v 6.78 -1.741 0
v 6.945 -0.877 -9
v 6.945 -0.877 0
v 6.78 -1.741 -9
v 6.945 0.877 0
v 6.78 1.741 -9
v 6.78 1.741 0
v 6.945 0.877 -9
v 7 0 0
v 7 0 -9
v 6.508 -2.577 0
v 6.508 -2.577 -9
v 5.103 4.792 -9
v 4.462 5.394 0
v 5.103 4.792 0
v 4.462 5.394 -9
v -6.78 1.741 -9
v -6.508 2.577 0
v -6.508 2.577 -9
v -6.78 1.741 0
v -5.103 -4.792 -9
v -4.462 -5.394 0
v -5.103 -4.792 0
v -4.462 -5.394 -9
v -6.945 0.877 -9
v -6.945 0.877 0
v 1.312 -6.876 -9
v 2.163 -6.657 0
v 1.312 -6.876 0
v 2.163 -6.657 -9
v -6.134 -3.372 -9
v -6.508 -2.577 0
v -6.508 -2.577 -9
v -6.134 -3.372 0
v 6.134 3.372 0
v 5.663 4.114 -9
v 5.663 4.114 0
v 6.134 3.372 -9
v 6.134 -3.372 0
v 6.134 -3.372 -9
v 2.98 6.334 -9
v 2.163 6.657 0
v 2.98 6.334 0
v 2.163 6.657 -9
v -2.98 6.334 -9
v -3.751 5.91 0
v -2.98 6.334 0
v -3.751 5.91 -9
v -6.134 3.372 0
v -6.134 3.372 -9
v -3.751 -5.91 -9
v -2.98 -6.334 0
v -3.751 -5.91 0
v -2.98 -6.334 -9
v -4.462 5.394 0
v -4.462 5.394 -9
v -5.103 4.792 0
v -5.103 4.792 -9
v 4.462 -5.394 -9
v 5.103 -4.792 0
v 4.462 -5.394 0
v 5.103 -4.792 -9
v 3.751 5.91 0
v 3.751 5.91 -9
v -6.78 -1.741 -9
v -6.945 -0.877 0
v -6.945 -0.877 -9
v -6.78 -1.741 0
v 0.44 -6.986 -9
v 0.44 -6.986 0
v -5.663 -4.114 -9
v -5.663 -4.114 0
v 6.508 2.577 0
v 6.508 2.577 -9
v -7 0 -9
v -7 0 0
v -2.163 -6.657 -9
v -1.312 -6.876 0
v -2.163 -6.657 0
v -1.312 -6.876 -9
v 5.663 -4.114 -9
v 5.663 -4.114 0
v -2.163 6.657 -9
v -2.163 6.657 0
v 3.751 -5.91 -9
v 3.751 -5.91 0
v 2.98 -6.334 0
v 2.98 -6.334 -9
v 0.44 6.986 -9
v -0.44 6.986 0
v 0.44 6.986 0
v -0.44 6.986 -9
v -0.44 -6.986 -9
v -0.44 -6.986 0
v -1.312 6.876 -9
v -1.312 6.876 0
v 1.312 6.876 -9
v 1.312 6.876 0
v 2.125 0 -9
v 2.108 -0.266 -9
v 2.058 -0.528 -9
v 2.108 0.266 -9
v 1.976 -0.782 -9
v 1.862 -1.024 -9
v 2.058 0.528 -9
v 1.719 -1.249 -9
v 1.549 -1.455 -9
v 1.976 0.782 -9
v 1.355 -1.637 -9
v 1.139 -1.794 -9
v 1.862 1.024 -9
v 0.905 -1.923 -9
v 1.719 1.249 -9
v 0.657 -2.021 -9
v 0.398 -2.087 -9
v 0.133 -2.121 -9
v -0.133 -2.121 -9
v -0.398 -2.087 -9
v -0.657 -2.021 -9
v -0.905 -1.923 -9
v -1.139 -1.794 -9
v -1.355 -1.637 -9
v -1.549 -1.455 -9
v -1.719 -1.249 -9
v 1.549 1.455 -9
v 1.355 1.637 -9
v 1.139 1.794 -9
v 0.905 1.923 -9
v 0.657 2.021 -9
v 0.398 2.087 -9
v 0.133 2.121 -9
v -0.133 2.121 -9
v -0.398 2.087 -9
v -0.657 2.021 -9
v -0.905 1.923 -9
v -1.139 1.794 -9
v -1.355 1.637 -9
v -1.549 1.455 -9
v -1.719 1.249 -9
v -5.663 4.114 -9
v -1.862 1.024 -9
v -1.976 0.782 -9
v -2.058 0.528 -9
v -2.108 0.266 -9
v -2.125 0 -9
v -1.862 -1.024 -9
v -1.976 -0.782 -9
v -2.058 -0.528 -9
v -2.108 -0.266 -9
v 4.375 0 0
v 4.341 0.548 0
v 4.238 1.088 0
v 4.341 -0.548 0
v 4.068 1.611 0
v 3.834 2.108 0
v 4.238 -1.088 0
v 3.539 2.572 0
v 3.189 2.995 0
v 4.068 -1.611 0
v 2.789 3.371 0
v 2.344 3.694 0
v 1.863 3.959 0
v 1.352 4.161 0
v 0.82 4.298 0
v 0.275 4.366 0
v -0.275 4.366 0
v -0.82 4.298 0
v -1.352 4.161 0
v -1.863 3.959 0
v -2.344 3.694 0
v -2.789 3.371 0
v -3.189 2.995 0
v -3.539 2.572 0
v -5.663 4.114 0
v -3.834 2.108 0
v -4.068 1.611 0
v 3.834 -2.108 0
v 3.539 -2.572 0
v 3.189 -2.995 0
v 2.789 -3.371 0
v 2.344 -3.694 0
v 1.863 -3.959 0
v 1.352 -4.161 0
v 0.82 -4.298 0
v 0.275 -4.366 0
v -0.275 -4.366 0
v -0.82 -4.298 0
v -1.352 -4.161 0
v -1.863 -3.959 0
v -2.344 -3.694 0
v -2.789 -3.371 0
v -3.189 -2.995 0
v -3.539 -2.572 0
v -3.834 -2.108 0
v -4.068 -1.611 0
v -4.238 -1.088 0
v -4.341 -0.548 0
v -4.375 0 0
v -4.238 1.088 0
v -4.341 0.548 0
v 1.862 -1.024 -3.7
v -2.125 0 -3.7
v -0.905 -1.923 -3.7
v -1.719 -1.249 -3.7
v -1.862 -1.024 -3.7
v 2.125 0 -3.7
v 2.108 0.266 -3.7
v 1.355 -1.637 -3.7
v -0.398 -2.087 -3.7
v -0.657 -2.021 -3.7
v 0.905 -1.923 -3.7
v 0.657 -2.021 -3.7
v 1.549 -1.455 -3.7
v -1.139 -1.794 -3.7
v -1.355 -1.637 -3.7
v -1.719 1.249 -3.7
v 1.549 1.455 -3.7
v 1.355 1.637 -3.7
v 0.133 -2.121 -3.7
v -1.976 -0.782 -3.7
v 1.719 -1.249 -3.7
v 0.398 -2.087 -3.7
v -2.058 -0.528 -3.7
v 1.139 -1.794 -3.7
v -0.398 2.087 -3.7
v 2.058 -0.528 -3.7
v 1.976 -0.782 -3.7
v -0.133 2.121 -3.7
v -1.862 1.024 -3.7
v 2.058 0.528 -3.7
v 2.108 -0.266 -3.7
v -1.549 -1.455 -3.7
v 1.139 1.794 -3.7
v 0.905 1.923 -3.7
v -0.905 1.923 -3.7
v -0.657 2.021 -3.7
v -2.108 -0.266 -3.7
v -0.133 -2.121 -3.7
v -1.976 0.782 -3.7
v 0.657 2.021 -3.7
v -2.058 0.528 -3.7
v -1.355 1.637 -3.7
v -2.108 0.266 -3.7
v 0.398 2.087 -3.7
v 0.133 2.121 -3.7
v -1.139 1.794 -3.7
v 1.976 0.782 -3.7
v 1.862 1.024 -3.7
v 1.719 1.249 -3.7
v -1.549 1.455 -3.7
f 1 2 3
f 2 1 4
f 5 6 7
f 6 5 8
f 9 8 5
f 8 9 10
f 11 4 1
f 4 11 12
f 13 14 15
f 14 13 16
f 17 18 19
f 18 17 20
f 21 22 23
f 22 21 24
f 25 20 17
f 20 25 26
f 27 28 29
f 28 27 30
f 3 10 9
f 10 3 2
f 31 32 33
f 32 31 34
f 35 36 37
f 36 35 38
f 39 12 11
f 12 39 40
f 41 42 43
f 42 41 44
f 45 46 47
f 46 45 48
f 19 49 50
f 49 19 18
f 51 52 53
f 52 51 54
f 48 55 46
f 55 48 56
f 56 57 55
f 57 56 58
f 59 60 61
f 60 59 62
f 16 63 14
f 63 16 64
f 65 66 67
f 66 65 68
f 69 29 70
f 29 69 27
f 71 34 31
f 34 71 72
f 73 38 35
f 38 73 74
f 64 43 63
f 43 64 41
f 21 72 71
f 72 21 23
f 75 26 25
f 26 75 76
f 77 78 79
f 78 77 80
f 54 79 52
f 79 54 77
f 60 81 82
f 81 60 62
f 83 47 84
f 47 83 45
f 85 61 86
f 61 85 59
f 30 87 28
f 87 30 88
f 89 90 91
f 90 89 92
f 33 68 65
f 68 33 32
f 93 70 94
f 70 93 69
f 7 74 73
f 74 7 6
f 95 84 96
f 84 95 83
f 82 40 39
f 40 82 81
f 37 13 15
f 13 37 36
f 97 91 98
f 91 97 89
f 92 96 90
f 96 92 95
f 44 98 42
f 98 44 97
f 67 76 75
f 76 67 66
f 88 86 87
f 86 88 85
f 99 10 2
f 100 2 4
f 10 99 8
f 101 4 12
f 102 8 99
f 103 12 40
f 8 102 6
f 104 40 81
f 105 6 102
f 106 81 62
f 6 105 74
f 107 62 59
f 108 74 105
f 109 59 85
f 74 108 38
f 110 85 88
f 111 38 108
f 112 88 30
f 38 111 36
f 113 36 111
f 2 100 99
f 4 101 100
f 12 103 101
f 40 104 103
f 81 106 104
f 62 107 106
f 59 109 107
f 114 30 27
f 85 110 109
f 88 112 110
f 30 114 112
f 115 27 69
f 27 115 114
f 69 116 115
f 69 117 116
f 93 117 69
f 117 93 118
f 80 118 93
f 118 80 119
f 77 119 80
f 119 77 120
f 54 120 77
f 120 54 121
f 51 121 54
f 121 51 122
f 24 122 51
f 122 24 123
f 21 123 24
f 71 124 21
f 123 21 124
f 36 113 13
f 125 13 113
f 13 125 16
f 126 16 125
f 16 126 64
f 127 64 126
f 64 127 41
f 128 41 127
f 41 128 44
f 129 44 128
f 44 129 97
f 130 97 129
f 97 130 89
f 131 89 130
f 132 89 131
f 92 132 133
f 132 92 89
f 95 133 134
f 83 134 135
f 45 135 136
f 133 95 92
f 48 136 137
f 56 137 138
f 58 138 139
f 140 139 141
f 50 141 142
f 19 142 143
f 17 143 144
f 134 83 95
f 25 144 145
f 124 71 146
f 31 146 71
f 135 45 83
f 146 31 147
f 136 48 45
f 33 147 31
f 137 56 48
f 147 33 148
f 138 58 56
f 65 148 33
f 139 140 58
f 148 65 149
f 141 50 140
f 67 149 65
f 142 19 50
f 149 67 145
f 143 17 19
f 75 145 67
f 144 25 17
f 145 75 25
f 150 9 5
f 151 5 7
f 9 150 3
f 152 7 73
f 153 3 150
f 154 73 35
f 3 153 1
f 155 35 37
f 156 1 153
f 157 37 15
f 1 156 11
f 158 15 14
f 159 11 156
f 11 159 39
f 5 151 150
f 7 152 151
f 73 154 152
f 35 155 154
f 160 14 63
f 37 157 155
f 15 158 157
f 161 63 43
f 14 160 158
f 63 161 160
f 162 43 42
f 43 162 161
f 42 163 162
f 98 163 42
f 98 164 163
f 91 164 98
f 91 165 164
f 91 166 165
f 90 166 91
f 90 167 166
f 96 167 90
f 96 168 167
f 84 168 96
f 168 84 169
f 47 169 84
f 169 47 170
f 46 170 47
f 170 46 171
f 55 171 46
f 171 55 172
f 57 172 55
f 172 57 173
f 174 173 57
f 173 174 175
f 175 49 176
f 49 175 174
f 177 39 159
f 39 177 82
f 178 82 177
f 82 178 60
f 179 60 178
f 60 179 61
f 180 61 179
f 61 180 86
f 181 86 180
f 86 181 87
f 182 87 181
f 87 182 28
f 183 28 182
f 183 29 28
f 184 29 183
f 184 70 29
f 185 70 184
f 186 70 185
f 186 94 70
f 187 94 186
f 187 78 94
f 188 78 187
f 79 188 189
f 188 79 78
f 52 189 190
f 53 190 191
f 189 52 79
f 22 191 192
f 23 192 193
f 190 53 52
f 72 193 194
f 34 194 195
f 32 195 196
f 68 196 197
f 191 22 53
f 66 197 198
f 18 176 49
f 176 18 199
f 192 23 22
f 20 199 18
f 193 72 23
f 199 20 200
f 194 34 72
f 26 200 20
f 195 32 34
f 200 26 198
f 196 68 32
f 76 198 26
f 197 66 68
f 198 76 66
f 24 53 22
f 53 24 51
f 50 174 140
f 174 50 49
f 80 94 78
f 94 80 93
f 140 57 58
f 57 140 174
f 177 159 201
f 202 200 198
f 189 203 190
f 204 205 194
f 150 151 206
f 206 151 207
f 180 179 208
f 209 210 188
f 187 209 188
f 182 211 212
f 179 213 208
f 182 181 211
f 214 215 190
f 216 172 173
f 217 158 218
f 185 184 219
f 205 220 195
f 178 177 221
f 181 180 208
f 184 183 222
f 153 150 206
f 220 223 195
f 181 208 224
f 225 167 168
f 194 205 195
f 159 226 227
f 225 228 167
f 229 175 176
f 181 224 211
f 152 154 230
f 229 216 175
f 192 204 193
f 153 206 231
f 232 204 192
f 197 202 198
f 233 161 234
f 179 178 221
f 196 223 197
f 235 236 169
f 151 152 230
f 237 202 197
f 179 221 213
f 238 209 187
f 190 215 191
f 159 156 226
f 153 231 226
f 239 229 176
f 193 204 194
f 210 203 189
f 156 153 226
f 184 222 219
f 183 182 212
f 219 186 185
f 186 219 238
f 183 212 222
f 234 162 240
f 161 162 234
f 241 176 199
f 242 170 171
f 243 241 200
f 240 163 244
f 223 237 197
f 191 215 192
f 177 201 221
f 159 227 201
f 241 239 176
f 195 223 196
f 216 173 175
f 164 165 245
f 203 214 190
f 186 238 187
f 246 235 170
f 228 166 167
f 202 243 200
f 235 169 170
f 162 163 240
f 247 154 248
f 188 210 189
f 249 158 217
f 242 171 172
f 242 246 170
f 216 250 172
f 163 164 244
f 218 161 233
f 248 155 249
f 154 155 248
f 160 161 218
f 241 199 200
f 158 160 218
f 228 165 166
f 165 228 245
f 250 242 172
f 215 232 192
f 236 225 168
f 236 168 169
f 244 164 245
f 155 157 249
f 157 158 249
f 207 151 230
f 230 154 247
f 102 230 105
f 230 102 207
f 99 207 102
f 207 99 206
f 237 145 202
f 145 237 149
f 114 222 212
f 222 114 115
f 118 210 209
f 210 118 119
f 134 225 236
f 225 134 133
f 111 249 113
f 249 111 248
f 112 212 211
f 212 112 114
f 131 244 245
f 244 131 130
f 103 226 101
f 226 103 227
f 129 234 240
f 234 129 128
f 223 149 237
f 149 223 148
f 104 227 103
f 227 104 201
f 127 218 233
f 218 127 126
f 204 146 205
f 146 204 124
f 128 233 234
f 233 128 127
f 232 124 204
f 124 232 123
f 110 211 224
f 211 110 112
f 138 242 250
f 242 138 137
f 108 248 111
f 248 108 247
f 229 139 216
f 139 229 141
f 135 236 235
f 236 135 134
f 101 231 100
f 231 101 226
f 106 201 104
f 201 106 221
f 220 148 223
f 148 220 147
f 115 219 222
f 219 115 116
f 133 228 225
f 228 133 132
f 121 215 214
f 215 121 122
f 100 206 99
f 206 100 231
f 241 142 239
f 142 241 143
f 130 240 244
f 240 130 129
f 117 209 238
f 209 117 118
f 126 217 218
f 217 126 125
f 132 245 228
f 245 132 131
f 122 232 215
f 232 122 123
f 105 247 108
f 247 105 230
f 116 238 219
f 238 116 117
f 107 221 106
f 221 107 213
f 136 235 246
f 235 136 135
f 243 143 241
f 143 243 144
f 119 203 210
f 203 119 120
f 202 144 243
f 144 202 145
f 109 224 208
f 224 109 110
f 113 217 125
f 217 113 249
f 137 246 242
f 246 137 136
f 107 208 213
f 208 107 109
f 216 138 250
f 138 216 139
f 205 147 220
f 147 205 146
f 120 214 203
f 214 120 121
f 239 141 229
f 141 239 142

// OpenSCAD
$fn = 50;


difference() {
	union() {
		translate(v = [0, 0, -9.0000000000]) {
			cylinder(h = 9, r = 7.0000000000);
		}
		translate(v = [0, 0, -9.0000000000]) {
			cylinder(h = 9, r = 2.8750000000);
		}
	}
	union() {
		translate(v = [0, 0, 0]) {
			rotate(a = [0, 0, 0]) {
				difference() {
					union() {
						translate(v = [0, 0, -9.0000000000]) {
							cylinder(h = 9, r = 2.0000000000);
						}
						translate(v = [0, 0, -3.7000000000]) {
							cylinder(h = 3.7000000000, r1 = 2.1250000000, r2 = 4.3750000000);
						}
						translate(v = [0, 0, -9.0000000000]) {
							cylinder(h = 9, r = 2.1250000000);
						}
						translate(v = [0, 0, -9.0000000000]) {
							cylinder(h = 9, r = 2.0000000000);
						}
					}
					union();
				}
			}
		}
	}
}
